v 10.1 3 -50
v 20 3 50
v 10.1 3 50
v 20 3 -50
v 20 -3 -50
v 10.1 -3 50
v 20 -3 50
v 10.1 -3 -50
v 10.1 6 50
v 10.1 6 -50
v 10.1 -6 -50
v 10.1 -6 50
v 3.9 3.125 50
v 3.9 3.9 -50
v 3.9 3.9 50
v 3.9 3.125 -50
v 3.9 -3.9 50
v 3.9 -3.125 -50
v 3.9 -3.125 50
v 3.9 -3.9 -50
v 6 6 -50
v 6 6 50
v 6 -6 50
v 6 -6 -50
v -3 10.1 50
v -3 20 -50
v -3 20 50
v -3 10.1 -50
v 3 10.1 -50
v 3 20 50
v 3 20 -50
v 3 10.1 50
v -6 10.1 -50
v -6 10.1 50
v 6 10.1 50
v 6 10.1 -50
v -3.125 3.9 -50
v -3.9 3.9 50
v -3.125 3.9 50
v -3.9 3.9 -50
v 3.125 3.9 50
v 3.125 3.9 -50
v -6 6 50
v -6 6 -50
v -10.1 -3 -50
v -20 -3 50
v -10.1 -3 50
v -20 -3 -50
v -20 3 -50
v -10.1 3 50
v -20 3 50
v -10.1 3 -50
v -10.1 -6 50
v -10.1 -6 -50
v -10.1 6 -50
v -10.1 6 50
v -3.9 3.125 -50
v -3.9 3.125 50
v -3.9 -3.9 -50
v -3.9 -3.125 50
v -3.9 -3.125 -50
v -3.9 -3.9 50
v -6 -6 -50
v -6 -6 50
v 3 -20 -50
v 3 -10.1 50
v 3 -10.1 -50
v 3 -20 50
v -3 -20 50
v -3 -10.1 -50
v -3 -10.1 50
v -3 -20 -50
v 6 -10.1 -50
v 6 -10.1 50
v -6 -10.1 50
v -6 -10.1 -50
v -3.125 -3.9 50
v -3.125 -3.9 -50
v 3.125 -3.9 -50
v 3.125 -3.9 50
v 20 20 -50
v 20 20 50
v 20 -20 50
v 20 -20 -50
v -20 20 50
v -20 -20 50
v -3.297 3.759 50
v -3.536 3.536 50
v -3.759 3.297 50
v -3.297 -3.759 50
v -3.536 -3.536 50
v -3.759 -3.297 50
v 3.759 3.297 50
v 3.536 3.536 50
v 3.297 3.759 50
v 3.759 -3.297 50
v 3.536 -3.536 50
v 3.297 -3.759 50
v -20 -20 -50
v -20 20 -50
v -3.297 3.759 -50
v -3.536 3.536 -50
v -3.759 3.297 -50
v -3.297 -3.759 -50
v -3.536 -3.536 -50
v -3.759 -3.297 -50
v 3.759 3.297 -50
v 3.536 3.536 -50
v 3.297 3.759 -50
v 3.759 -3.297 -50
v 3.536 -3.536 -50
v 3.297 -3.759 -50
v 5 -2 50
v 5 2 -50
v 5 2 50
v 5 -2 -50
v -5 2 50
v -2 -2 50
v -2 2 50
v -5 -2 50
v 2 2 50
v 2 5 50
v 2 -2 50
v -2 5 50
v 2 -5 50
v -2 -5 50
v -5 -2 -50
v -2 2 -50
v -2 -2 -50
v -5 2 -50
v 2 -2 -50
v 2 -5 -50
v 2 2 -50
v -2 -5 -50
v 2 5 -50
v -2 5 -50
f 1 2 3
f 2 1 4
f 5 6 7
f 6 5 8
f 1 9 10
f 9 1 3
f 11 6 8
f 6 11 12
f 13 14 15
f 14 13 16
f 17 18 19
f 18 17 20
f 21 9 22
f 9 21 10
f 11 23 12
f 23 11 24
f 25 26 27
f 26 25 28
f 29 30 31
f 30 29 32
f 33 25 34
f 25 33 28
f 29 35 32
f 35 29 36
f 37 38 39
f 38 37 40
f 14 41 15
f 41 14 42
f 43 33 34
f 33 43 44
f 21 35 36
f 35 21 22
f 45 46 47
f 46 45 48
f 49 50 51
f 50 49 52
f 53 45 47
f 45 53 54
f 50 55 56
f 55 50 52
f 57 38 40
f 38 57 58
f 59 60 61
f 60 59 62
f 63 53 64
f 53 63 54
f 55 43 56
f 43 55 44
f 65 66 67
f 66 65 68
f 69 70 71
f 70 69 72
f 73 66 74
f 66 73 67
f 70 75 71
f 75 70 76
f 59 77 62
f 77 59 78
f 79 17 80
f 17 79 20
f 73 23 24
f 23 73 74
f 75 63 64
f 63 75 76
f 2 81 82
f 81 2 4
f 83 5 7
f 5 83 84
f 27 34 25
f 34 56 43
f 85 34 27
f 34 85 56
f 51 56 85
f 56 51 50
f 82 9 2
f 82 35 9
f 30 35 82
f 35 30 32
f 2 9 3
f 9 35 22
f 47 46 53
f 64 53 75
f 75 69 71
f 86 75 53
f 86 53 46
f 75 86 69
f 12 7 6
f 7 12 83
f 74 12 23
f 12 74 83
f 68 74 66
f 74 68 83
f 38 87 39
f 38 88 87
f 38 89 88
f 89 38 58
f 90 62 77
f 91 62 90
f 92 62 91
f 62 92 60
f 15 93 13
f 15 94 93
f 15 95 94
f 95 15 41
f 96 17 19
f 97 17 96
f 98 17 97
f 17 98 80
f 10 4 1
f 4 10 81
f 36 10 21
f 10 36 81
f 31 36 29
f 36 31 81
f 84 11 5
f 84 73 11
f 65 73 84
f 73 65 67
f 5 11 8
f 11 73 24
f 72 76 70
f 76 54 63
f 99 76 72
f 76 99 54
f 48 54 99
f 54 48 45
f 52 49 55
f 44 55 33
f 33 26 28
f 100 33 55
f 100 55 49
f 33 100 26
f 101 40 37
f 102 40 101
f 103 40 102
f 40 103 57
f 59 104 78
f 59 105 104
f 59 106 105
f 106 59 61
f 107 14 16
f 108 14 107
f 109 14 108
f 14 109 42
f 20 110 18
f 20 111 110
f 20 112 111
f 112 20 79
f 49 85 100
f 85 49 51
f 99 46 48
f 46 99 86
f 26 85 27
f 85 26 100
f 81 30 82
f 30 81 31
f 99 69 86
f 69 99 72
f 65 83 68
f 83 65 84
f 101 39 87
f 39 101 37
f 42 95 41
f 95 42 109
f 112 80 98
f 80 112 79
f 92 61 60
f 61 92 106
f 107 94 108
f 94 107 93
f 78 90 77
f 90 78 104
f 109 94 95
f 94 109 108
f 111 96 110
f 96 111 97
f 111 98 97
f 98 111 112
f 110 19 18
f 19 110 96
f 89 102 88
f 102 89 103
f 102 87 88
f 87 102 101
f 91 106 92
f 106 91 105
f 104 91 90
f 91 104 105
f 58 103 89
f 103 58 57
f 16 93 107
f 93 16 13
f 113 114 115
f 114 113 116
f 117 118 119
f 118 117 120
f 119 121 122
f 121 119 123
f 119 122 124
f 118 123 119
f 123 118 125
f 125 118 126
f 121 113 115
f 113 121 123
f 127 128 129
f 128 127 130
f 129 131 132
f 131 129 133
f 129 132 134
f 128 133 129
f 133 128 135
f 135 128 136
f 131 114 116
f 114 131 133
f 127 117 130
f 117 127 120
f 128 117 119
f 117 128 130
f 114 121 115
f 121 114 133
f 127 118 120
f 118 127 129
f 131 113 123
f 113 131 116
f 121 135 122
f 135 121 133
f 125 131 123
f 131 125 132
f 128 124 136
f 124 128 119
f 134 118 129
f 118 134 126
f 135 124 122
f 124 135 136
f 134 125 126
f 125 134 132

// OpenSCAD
$fn = 96;

// 40x40 aluminium extrusion (approximate T-slot style), 100mm long
// Ensures: one connected solid, clear 40x40 outer envelope, 100mm length.
module extrusion_40x40(length=100, size=40) {
    half = size/2;
    eps  = 0.2;

    // Slot geometry (kept conservative so outer envelope remains 40x40)
    slot_open    = 6;    // opening width at outer face
    slot_depth   = 10;   // depth from outer face inward
    slot_inner_w = 12;   // inner cavity width
    slot_inner_d = 6;    // additional depth for inner cavity

    // Center bore
    center_bore_r = 5;

    // Internal webs (guarantee connectivity)
    web_th = 4;

    // Derived: keep webs inside the remaining core after slot cuts
    core = size - 2*(slot_depth + slot_inner_d);
    web_len = max(core, web_th + 2); // never negative/zero

    union() {
        // Main body with cuts
        difference() {
            cube([size, size, length], center=true);

            // Four T-slots (cut from outside faces inward)
            for (a = [0, 90, 180, 270]) {
                rotate([0, 0, a]) {
                    // Narrow mouth cut
                    translate([half - slot_depth/2, 0, 0])
                        cube([slot_depth + eps, slot_open, length + 2*eps], center=true);

                    // Wider inner cavity cut (deeper inside)
                    translate([half - slot_depth - slot_inner_d/2, 0, 0])
                        cube([slot_inner_d + eps, slot_inner_w, length + 2*eps], center=true);
                }
            }

            // Center bore through length
            cylinder(r=center_bore_r, h=length + 2*eps, center=true);
        }

        // Internal webs added back (overlap ensures single connected solid)
        cube([web_len + 2, web_th, length], center=true);
        cube([web_th, web_len + 2, length], center=true);
    }
}

// Render
extrusion_40x40(length=100, size=40);
